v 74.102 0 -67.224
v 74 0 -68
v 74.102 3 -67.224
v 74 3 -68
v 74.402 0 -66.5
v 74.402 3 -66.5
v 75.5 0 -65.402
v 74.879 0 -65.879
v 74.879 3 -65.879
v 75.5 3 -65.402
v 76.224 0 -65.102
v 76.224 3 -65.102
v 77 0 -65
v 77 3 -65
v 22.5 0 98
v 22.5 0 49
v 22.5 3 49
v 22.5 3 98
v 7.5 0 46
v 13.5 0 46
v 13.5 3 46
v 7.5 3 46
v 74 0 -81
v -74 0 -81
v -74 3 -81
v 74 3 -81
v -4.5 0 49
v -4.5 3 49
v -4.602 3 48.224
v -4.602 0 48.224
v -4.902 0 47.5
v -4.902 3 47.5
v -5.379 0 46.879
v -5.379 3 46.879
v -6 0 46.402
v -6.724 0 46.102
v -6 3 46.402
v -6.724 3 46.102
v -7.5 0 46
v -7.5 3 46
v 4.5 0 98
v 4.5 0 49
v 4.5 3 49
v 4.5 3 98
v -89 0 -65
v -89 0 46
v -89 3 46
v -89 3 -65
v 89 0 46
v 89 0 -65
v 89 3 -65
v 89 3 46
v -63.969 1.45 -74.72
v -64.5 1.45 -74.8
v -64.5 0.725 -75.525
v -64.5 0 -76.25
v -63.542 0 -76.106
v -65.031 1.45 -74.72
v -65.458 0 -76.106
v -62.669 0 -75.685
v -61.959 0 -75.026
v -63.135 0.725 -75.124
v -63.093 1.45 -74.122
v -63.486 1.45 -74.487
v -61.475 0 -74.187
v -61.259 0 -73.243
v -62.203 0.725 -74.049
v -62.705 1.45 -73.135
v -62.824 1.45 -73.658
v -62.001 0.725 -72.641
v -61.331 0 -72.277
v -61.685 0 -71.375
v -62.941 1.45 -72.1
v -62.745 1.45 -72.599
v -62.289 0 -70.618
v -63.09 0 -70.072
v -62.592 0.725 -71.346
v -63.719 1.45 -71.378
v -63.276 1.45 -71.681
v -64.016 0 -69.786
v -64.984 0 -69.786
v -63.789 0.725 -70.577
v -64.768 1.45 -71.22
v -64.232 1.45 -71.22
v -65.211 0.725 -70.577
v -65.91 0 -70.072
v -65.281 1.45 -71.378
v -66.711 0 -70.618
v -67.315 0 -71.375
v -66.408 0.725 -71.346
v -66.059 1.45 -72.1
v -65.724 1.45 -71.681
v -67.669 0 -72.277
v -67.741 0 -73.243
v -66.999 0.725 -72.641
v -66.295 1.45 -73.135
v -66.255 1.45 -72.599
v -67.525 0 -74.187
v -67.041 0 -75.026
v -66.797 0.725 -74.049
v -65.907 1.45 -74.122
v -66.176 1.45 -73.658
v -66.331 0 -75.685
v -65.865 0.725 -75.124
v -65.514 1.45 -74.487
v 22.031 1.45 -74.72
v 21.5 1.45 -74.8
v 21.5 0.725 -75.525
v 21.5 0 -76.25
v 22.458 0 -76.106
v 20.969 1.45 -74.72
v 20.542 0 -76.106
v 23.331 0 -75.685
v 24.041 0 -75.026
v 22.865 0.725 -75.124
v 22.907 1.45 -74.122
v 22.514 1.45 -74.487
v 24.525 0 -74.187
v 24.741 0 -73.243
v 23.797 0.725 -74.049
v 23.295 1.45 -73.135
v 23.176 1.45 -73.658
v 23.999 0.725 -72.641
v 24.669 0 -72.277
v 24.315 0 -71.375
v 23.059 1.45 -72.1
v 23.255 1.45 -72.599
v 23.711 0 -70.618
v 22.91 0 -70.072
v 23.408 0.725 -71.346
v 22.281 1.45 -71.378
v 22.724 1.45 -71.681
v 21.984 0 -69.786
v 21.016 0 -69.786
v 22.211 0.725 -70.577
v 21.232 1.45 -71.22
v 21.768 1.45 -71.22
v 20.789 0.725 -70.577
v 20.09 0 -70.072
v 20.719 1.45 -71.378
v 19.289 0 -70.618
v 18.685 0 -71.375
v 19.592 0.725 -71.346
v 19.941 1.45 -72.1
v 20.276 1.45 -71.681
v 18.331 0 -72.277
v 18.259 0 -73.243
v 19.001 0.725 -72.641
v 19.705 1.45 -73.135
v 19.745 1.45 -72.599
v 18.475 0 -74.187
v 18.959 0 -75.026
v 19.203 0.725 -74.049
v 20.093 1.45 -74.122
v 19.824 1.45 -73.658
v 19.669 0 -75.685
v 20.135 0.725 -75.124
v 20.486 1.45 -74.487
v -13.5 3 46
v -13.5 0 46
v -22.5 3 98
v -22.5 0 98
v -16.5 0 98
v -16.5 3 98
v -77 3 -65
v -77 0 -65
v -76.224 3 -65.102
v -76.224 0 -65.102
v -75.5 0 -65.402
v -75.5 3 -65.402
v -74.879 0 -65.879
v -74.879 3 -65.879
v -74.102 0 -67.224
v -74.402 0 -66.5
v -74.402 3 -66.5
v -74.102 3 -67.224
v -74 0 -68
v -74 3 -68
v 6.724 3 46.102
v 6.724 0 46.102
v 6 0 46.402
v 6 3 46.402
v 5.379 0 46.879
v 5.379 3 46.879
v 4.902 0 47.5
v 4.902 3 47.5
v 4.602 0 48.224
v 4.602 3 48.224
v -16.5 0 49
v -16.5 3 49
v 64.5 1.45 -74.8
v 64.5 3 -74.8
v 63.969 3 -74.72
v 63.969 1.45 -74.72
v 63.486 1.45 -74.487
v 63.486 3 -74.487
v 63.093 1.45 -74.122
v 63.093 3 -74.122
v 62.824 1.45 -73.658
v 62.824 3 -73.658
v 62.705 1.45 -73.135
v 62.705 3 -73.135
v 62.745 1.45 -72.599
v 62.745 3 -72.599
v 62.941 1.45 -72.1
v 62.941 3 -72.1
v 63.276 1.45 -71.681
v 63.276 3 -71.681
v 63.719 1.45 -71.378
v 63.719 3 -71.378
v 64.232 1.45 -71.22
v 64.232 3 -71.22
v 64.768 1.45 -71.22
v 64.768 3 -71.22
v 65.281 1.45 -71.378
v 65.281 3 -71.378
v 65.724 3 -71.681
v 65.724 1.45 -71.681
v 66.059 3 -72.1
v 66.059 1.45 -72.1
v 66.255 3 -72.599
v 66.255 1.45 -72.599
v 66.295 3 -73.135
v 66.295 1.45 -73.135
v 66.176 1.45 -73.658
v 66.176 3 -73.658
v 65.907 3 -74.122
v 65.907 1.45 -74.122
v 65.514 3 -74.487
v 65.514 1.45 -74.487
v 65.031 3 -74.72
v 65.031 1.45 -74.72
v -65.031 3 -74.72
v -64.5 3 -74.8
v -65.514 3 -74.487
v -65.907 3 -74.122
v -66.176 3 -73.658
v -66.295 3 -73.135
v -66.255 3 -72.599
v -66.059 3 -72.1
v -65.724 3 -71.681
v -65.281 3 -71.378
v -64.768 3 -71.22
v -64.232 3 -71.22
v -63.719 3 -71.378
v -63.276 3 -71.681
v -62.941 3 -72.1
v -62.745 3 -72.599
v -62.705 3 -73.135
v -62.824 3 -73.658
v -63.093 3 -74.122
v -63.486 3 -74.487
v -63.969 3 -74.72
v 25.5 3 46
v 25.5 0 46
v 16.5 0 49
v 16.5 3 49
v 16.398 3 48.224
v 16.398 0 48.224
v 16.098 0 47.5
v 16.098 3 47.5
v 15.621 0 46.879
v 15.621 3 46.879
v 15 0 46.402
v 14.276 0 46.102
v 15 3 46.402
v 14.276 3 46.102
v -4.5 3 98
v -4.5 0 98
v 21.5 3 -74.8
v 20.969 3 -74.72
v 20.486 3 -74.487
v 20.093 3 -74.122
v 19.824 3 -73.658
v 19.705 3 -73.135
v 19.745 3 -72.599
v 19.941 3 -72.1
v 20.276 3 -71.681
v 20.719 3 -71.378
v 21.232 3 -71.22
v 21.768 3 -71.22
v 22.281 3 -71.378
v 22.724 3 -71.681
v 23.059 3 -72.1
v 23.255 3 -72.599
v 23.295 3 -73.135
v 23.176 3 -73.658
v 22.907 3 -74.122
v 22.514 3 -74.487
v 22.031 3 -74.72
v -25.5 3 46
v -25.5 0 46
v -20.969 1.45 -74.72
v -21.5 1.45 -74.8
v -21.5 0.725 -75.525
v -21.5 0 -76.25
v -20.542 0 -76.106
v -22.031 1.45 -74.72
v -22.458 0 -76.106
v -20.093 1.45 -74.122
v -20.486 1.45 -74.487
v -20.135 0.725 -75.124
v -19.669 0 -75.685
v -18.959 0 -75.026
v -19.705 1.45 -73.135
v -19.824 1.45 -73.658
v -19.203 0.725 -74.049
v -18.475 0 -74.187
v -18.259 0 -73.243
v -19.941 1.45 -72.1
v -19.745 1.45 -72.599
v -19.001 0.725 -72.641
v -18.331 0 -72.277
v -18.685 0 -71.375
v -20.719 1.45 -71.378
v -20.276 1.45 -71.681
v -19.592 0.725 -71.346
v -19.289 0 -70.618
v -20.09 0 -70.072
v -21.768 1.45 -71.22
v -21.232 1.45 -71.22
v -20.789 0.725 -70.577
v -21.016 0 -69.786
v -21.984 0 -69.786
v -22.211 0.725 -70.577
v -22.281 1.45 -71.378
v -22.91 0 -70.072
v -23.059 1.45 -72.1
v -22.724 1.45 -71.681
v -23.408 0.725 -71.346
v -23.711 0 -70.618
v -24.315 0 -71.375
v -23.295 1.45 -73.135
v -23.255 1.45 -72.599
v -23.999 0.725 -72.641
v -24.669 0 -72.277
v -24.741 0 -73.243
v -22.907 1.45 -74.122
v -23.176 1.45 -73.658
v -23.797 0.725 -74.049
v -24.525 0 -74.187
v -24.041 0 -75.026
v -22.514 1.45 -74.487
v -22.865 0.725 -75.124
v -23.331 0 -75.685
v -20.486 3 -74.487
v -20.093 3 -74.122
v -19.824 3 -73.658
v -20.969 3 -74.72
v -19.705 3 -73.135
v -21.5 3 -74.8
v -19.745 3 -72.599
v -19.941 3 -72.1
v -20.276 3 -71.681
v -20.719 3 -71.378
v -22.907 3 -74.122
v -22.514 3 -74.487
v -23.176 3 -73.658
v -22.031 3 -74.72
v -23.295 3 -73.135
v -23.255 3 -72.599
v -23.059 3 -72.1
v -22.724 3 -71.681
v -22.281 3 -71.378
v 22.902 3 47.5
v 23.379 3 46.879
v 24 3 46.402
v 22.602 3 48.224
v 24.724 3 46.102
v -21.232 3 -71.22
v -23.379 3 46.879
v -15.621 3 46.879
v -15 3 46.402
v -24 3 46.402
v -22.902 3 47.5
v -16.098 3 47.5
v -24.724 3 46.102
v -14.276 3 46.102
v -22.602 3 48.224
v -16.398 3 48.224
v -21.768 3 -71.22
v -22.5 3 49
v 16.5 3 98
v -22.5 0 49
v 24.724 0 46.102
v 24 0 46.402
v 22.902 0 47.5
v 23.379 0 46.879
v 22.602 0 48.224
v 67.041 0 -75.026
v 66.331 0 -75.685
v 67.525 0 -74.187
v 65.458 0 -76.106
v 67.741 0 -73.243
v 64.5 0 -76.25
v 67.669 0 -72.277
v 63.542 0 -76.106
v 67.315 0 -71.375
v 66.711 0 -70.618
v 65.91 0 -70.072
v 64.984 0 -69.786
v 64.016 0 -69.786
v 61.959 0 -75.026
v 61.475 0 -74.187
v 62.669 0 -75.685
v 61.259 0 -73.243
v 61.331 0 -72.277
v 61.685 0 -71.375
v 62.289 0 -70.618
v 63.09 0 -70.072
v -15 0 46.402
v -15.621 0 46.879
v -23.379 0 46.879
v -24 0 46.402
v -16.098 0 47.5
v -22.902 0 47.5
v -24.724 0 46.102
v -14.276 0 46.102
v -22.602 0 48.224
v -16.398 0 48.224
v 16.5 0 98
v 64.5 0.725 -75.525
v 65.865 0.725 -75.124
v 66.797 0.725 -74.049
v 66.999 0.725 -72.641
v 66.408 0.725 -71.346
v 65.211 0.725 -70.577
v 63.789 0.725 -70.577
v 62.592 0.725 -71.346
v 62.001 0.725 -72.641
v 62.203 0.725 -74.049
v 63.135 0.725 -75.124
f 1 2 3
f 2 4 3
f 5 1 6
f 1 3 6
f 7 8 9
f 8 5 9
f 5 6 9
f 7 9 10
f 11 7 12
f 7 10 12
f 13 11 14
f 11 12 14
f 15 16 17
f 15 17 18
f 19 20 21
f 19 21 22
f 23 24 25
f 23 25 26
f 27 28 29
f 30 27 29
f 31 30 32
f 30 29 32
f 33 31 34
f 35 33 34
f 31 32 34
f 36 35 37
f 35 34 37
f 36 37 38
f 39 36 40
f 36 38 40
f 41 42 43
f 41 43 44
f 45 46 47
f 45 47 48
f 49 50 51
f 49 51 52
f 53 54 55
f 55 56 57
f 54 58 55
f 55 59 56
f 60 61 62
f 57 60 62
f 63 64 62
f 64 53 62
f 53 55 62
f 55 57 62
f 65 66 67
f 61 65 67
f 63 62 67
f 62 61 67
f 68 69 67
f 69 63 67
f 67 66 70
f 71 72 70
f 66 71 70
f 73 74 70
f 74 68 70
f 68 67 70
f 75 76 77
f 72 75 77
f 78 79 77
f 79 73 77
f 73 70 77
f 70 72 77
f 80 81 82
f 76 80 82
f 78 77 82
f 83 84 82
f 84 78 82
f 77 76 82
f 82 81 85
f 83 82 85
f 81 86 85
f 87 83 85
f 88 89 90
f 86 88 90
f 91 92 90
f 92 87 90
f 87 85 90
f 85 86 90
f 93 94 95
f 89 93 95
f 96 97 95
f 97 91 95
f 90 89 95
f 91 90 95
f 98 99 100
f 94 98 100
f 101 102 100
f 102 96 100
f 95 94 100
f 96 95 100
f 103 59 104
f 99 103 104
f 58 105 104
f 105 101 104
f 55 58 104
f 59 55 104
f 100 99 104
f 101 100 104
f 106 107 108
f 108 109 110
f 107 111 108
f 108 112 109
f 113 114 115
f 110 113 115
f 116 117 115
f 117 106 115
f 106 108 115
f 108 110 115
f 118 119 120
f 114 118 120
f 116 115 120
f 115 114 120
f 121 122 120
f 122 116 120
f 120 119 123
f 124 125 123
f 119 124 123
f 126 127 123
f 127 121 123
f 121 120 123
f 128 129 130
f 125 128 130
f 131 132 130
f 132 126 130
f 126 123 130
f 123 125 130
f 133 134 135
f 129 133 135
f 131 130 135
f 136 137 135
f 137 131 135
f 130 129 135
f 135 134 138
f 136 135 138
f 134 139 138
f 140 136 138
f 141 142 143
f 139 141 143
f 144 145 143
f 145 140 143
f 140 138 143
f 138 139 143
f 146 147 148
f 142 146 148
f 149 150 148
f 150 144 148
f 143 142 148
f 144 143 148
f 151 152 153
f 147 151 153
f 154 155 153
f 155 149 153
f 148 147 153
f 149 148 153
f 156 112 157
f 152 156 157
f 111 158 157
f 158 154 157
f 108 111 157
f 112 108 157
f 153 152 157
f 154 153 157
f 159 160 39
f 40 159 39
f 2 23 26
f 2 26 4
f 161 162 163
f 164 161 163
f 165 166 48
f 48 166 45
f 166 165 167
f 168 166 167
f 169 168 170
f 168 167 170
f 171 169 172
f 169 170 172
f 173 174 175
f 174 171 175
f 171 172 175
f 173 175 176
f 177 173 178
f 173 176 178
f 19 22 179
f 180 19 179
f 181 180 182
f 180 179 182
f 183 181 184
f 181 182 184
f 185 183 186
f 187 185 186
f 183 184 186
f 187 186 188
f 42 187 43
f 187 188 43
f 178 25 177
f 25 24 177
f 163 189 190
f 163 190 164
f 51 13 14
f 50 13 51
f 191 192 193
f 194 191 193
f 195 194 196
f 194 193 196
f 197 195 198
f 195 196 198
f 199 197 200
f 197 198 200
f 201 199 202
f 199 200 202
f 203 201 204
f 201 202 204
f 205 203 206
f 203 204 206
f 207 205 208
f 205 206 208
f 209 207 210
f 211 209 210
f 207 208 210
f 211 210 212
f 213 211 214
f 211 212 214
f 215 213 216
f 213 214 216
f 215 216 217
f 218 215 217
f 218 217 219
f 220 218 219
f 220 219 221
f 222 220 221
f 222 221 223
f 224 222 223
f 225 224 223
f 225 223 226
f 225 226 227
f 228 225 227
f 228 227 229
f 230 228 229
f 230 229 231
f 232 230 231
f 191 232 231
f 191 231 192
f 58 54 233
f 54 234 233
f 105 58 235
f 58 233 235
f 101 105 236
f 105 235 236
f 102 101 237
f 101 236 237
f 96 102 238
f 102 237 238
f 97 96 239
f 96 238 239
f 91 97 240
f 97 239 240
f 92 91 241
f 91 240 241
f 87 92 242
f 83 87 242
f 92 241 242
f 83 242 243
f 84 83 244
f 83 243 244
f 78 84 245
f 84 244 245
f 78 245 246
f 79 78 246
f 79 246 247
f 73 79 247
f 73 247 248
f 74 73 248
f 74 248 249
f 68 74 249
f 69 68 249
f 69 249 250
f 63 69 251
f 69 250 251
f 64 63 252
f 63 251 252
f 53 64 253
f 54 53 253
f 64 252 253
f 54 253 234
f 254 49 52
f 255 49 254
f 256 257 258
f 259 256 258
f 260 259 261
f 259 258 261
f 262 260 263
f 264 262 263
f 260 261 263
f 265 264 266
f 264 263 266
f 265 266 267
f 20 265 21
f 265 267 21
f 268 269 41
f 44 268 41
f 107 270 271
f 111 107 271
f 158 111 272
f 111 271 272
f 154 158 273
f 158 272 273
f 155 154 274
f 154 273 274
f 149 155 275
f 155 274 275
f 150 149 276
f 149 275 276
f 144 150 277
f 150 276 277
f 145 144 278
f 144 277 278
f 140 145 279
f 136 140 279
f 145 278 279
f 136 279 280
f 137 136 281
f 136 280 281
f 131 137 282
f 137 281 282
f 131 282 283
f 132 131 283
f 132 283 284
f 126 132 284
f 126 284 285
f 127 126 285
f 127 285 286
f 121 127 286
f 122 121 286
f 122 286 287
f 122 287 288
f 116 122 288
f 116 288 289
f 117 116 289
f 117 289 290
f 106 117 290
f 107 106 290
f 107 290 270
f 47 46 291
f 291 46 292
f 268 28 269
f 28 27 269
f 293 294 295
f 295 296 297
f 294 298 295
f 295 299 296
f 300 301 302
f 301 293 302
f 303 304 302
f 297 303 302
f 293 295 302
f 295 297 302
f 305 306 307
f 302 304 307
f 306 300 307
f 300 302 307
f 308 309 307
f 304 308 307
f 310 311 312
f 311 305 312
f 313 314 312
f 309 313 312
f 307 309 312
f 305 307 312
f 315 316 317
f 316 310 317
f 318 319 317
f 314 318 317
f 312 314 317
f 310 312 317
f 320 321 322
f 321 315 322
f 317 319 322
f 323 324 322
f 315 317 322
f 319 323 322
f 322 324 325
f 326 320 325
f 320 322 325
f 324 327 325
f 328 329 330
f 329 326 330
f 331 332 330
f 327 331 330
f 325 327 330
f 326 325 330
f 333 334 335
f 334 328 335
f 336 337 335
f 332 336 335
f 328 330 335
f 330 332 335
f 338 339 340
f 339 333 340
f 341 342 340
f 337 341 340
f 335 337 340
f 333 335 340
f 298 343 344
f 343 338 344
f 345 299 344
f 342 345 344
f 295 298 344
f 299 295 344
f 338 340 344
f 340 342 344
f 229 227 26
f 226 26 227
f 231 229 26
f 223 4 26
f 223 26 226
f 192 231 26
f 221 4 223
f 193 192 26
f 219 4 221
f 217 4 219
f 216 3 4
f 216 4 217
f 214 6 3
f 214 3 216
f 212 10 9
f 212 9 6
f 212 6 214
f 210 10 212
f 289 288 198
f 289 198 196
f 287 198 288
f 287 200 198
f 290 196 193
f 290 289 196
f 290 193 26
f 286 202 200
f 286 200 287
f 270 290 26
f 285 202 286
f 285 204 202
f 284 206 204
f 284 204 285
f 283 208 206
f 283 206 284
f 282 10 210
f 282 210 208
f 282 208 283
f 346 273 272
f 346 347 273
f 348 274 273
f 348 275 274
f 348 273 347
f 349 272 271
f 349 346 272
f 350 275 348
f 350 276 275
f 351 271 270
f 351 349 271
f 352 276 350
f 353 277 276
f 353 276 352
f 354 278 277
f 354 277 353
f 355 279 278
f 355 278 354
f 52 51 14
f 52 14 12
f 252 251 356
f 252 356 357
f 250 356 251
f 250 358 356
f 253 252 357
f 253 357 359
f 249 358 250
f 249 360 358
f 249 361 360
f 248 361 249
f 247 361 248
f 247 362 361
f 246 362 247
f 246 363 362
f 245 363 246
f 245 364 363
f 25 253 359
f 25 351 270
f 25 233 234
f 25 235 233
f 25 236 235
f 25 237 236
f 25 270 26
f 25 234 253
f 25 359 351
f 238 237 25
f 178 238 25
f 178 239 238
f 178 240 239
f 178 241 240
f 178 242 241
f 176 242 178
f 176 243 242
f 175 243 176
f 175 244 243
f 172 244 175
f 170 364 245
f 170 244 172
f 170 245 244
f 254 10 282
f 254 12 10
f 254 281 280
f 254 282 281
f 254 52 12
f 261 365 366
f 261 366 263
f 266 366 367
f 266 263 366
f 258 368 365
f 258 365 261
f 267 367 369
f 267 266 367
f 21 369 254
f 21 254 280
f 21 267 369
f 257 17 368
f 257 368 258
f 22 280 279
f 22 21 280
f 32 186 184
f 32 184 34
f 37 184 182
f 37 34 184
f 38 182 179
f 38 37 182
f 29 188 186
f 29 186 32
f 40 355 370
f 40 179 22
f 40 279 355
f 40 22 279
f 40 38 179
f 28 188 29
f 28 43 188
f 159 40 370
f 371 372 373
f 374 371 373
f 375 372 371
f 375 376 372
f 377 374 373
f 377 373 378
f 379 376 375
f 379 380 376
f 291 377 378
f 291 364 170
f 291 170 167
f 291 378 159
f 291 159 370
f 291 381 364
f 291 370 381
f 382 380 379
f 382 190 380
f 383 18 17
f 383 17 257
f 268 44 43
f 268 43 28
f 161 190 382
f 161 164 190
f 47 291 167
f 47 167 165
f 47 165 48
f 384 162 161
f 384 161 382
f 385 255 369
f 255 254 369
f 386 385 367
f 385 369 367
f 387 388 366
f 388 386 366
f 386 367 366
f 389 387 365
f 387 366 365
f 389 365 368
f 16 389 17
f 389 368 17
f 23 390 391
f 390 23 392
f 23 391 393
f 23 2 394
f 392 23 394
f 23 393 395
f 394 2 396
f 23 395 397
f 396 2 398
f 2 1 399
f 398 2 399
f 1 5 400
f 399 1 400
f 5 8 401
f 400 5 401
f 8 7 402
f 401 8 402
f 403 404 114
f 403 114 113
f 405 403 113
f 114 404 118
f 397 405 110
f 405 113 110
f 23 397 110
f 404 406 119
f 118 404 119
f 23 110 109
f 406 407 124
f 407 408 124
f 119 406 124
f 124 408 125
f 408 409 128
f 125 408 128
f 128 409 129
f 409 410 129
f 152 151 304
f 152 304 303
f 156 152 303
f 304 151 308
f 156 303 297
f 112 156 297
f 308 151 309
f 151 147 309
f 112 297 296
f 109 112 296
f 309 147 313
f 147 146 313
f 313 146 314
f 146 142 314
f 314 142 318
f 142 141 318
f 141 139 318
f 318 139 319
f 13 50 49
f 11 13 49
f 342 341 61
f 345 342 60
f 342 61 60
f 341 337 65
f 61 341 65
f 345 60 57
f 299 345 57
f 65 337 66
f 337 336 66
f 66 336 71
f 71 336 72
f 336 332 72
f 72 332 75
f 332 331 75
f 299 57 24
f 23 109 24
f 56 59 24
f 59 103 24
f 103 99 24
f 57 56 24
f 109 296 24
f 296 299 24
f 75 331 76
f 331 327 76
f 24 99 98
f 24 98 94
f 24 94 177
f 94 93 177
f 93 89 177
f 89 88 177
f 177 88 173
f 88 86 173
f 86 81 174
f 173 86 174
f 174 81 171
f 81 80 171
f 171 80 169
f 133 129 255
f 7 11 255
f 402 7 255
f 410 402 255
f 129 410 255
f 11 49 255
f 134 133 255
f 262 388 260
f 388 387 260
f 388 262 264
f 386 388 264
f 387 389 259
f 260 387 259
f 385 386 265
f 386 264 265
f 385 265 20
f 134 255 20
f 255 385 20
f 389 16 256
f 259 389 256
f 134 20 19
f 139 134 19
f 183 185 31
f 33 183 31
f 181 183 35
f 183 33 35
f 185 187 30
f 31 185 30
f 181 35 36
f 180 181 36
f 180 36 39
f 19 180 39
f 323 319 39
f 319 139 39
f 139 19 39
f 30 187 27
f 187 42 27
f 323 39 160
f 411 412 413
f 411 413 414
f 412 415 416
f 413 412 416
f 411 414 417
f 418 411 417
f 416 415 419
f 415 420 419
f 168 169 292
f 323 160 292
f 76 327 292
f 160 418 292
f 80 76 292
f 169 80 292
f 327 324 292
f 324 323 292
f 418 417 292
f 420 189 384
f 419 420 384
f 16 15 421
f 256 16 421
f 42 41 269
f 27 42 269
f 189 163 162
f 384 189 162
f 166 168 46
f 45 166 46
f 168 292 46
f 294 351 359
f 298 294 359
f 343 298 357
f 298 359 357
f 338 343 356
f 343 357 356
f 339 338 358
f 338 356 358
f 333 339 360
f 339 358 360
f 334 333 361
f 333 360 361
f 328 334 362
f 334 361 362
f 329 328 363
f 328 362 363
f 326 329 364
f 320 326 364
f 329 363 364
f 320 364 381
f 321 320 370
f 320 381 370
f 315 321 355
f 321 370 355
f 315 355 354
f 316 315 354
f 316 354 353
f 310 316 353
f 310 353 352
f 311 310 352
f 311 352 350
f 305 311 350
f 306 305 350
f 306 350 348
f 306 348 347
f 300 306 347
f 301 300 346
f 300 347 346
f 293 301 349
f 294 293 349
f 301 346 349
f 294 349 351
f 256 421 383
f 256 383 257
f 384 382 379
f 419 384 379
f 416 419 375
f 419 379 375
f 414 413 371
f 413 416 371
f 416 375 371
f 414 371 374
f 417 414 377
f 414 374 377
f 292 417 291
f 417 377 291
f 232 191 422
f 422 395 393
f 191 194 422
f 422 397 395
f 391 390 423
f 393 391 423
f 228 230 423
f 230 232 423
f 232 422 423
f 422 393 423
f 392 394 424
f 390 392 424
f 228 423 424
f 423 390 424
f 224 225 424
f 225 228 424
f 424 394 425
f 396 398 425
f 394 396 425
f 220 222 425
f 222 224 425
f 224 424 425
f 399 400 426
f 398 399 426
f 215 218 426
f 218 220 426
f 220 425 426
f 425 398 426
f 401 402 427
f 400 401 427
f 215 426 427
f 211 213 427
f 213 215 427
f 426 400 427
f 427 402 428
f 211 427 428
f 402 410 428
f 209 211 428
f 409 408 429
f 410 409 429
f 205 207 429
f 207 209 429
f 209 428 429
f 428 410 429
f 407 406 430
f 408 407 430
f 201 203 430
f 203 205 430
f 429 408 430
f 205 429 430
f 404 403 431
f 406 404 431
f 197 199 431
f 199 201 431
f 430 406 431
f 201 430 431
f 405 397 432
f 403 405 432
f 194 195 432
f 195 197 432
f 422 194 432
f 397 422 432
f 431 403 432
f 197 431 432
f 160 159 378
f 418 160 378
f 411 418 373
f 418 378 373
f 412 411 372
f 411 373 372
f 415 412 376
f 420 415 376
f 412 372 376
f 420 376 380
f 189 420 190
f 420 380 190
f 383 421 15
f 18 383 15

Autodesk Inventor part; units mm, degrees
ref_plane "YZ Plane" through (0, 0, 0) normal (1, 0, 0) x (0, 1, 0)
ref_plane "XZ Plane" through (0, 0, 0) normal (0, 1, 0) x (-1, 0, 0)
ref_plane "XY Plane" through (0, 0, 0) normal (0, 0, 1) x (1, 0, 0)
sketch "Sketch2" plane through (0, 0, 0) normal (0, 1, 0) x (-1, 0, 0)
  line L0 (-89, 99) -> (89, 99)
  line L1 (89, 99) -> (89, -99)
  line L2 (89, -99) -> (-89, -99)
  line L3 (-89, -99) -> (-89, 99)
  line L4 (-89, 99) -> (89, -99) construction
  line L5 (89, 99) -> (-89, -99) construction
  line L6 (-89, 99) -> (89, 99)
  line L7 (89, 99) -> (89, -81)
  line L8 (89, -81) -> (-89, -81)
  line L9 (-89, -81) -> (-89, 99)
  line L10 (-4.5, 99) -> (-89, 99)
  line L11 (-89, 99) -> (-89, 46)
  line L12 (-89, 46) -> (-4.5, 46)
  line L13 (-4.5, 46) -> (-4.5, 99)
  line L14 (4.5, 99) -> (89, 99)
  line L15 (89, 99) -> (89, 46)
  line L16 (89, 46) -> (4.5, 46)
  line L17 (4.5, 46) -> (4.5, 99)
  line L18 (22.5, 77.5) -> (22.5, 66.5) projected
  line L19 (16.5, 66.5) -> (16.5, 77.5) projected
  line L20 (-22.5, 66.5) -> (-22.5, 77.5) projected
  line L21 (-16.5, 77.5) -> (-16.5, 66.5) projected
  line L22 (-22.5, 99) -> (-16.5, 99)
  line L23 (-16.5, 99) -> (-16.5, 46)
  line L24 (-16.5, 46) -> (-22.5, 46)
  line L25 (-22.5, 46) -> (-22.5, 99)
  line L26 (16.5, 99) -> (22.5, 99)
  line L27 (22.5, 99) -> (22.5, 46)
  line L28 (22.5, 46) -> (16.5, 46)
  line L29 (16.5, 46) -> (16.5, 99)
  line L30 (-89, 99) -> (89, 99)
  line L31 (89, 99) -> (89, 98)
  line L32 (89, 98) -> (-89, 98)
  line L33 (-89, 98) -> (-89, 99)
  line L34 (89, -81) -> (74, -81)
  line L35 (74, -81) -> (74, -65)
  line L36 (74, -65) -> (89, -65)
  line L37 (89, -65) -> (89, -81)
  line L38 (-89, -81) -> (-74, -81)
  line L39 (-74, -81) -> (-74, -65)
  line L40 (-74, -65) -> (-89, -65)
  line L41 (-89, -65) -> (-89, -81)
  point P0 (0, 0)
  point P1 (4.5, 99)
  point P2 (-4.5, 99)
  point P3 (-89, 46)
  point P4 (89, 46)
  point P5 (4.5, 98)
  point P6 (-4.5, 98)
  point P7 (-16.5, 98)
  point P8 (-22.5, 98)
  point P9 (22.5, 98)
  point P10 (16.5, 98)
  dimension "d8" = 178
  dimension "d9" = 198
  dimension "d10" = 18
  dimension "d11" = 84.5
  dimension "d12" = 53
  dimension "d13" = 84.5
  dimension "d14" = 53
  dimension "d17" = 9
  dimension "d18" = 1
  dimension "d19" = 15
  dimension "d20" = 16
  dimension "d21" = 15
  dimension "d22" = 16
extrude "Extrusion2" add sketch "Sketch2" along normal blind 3 contours L32 L23 L21 L12 L25 L20 | L12 L13 L32 L17 L16 L1 L36 L35 L8 L39 L40 L3 | L32 L27 L18 L16 L29 L19
fillet "Fillet1" radius 3 6 edges at (22.5, 1.5, 46) (-22.5, 1.5, 46) (-16.5, 1.5, 46) (-4.5, 1.5, 46) (4.5, 1.5, 46) (16.5, 1.5, 46)
fillet "Fillet2" radius 3 2 edges at (74, 1.5, -65) (-74, 1.5, -65)
sketch "Sketch5" plane through (0, 0, 0) normal (0, -1, 0) x (1, 0, 0)
  circle A0 centre (64.5, -73) radius 1.2295 projected
  circle A1 centre (21.5, -73) radius 1.2295 projected
  circle A2 centre (-21.5, -73) radius 1.2295 projected
  circle A3 centre (-64.5, -73) radius 1.2295 projected
  point P0 (0, 0)
hole "Hole2" at (64.5, 0, -73) at (21.5, 0, -73) at (-21.5, 0, -73) at (-64.5, 0, -73) direction (0, 1, 0) diameter 3.6 end through all countersink diameter 6.5 countersink angle 90 clearance for "Countersunk Flat Head Screw ISO 2009/7046" size "M3" standard "ISO"
equation "\"d11\" = d13"
properties part number "base" material "Aluminum 6061"
